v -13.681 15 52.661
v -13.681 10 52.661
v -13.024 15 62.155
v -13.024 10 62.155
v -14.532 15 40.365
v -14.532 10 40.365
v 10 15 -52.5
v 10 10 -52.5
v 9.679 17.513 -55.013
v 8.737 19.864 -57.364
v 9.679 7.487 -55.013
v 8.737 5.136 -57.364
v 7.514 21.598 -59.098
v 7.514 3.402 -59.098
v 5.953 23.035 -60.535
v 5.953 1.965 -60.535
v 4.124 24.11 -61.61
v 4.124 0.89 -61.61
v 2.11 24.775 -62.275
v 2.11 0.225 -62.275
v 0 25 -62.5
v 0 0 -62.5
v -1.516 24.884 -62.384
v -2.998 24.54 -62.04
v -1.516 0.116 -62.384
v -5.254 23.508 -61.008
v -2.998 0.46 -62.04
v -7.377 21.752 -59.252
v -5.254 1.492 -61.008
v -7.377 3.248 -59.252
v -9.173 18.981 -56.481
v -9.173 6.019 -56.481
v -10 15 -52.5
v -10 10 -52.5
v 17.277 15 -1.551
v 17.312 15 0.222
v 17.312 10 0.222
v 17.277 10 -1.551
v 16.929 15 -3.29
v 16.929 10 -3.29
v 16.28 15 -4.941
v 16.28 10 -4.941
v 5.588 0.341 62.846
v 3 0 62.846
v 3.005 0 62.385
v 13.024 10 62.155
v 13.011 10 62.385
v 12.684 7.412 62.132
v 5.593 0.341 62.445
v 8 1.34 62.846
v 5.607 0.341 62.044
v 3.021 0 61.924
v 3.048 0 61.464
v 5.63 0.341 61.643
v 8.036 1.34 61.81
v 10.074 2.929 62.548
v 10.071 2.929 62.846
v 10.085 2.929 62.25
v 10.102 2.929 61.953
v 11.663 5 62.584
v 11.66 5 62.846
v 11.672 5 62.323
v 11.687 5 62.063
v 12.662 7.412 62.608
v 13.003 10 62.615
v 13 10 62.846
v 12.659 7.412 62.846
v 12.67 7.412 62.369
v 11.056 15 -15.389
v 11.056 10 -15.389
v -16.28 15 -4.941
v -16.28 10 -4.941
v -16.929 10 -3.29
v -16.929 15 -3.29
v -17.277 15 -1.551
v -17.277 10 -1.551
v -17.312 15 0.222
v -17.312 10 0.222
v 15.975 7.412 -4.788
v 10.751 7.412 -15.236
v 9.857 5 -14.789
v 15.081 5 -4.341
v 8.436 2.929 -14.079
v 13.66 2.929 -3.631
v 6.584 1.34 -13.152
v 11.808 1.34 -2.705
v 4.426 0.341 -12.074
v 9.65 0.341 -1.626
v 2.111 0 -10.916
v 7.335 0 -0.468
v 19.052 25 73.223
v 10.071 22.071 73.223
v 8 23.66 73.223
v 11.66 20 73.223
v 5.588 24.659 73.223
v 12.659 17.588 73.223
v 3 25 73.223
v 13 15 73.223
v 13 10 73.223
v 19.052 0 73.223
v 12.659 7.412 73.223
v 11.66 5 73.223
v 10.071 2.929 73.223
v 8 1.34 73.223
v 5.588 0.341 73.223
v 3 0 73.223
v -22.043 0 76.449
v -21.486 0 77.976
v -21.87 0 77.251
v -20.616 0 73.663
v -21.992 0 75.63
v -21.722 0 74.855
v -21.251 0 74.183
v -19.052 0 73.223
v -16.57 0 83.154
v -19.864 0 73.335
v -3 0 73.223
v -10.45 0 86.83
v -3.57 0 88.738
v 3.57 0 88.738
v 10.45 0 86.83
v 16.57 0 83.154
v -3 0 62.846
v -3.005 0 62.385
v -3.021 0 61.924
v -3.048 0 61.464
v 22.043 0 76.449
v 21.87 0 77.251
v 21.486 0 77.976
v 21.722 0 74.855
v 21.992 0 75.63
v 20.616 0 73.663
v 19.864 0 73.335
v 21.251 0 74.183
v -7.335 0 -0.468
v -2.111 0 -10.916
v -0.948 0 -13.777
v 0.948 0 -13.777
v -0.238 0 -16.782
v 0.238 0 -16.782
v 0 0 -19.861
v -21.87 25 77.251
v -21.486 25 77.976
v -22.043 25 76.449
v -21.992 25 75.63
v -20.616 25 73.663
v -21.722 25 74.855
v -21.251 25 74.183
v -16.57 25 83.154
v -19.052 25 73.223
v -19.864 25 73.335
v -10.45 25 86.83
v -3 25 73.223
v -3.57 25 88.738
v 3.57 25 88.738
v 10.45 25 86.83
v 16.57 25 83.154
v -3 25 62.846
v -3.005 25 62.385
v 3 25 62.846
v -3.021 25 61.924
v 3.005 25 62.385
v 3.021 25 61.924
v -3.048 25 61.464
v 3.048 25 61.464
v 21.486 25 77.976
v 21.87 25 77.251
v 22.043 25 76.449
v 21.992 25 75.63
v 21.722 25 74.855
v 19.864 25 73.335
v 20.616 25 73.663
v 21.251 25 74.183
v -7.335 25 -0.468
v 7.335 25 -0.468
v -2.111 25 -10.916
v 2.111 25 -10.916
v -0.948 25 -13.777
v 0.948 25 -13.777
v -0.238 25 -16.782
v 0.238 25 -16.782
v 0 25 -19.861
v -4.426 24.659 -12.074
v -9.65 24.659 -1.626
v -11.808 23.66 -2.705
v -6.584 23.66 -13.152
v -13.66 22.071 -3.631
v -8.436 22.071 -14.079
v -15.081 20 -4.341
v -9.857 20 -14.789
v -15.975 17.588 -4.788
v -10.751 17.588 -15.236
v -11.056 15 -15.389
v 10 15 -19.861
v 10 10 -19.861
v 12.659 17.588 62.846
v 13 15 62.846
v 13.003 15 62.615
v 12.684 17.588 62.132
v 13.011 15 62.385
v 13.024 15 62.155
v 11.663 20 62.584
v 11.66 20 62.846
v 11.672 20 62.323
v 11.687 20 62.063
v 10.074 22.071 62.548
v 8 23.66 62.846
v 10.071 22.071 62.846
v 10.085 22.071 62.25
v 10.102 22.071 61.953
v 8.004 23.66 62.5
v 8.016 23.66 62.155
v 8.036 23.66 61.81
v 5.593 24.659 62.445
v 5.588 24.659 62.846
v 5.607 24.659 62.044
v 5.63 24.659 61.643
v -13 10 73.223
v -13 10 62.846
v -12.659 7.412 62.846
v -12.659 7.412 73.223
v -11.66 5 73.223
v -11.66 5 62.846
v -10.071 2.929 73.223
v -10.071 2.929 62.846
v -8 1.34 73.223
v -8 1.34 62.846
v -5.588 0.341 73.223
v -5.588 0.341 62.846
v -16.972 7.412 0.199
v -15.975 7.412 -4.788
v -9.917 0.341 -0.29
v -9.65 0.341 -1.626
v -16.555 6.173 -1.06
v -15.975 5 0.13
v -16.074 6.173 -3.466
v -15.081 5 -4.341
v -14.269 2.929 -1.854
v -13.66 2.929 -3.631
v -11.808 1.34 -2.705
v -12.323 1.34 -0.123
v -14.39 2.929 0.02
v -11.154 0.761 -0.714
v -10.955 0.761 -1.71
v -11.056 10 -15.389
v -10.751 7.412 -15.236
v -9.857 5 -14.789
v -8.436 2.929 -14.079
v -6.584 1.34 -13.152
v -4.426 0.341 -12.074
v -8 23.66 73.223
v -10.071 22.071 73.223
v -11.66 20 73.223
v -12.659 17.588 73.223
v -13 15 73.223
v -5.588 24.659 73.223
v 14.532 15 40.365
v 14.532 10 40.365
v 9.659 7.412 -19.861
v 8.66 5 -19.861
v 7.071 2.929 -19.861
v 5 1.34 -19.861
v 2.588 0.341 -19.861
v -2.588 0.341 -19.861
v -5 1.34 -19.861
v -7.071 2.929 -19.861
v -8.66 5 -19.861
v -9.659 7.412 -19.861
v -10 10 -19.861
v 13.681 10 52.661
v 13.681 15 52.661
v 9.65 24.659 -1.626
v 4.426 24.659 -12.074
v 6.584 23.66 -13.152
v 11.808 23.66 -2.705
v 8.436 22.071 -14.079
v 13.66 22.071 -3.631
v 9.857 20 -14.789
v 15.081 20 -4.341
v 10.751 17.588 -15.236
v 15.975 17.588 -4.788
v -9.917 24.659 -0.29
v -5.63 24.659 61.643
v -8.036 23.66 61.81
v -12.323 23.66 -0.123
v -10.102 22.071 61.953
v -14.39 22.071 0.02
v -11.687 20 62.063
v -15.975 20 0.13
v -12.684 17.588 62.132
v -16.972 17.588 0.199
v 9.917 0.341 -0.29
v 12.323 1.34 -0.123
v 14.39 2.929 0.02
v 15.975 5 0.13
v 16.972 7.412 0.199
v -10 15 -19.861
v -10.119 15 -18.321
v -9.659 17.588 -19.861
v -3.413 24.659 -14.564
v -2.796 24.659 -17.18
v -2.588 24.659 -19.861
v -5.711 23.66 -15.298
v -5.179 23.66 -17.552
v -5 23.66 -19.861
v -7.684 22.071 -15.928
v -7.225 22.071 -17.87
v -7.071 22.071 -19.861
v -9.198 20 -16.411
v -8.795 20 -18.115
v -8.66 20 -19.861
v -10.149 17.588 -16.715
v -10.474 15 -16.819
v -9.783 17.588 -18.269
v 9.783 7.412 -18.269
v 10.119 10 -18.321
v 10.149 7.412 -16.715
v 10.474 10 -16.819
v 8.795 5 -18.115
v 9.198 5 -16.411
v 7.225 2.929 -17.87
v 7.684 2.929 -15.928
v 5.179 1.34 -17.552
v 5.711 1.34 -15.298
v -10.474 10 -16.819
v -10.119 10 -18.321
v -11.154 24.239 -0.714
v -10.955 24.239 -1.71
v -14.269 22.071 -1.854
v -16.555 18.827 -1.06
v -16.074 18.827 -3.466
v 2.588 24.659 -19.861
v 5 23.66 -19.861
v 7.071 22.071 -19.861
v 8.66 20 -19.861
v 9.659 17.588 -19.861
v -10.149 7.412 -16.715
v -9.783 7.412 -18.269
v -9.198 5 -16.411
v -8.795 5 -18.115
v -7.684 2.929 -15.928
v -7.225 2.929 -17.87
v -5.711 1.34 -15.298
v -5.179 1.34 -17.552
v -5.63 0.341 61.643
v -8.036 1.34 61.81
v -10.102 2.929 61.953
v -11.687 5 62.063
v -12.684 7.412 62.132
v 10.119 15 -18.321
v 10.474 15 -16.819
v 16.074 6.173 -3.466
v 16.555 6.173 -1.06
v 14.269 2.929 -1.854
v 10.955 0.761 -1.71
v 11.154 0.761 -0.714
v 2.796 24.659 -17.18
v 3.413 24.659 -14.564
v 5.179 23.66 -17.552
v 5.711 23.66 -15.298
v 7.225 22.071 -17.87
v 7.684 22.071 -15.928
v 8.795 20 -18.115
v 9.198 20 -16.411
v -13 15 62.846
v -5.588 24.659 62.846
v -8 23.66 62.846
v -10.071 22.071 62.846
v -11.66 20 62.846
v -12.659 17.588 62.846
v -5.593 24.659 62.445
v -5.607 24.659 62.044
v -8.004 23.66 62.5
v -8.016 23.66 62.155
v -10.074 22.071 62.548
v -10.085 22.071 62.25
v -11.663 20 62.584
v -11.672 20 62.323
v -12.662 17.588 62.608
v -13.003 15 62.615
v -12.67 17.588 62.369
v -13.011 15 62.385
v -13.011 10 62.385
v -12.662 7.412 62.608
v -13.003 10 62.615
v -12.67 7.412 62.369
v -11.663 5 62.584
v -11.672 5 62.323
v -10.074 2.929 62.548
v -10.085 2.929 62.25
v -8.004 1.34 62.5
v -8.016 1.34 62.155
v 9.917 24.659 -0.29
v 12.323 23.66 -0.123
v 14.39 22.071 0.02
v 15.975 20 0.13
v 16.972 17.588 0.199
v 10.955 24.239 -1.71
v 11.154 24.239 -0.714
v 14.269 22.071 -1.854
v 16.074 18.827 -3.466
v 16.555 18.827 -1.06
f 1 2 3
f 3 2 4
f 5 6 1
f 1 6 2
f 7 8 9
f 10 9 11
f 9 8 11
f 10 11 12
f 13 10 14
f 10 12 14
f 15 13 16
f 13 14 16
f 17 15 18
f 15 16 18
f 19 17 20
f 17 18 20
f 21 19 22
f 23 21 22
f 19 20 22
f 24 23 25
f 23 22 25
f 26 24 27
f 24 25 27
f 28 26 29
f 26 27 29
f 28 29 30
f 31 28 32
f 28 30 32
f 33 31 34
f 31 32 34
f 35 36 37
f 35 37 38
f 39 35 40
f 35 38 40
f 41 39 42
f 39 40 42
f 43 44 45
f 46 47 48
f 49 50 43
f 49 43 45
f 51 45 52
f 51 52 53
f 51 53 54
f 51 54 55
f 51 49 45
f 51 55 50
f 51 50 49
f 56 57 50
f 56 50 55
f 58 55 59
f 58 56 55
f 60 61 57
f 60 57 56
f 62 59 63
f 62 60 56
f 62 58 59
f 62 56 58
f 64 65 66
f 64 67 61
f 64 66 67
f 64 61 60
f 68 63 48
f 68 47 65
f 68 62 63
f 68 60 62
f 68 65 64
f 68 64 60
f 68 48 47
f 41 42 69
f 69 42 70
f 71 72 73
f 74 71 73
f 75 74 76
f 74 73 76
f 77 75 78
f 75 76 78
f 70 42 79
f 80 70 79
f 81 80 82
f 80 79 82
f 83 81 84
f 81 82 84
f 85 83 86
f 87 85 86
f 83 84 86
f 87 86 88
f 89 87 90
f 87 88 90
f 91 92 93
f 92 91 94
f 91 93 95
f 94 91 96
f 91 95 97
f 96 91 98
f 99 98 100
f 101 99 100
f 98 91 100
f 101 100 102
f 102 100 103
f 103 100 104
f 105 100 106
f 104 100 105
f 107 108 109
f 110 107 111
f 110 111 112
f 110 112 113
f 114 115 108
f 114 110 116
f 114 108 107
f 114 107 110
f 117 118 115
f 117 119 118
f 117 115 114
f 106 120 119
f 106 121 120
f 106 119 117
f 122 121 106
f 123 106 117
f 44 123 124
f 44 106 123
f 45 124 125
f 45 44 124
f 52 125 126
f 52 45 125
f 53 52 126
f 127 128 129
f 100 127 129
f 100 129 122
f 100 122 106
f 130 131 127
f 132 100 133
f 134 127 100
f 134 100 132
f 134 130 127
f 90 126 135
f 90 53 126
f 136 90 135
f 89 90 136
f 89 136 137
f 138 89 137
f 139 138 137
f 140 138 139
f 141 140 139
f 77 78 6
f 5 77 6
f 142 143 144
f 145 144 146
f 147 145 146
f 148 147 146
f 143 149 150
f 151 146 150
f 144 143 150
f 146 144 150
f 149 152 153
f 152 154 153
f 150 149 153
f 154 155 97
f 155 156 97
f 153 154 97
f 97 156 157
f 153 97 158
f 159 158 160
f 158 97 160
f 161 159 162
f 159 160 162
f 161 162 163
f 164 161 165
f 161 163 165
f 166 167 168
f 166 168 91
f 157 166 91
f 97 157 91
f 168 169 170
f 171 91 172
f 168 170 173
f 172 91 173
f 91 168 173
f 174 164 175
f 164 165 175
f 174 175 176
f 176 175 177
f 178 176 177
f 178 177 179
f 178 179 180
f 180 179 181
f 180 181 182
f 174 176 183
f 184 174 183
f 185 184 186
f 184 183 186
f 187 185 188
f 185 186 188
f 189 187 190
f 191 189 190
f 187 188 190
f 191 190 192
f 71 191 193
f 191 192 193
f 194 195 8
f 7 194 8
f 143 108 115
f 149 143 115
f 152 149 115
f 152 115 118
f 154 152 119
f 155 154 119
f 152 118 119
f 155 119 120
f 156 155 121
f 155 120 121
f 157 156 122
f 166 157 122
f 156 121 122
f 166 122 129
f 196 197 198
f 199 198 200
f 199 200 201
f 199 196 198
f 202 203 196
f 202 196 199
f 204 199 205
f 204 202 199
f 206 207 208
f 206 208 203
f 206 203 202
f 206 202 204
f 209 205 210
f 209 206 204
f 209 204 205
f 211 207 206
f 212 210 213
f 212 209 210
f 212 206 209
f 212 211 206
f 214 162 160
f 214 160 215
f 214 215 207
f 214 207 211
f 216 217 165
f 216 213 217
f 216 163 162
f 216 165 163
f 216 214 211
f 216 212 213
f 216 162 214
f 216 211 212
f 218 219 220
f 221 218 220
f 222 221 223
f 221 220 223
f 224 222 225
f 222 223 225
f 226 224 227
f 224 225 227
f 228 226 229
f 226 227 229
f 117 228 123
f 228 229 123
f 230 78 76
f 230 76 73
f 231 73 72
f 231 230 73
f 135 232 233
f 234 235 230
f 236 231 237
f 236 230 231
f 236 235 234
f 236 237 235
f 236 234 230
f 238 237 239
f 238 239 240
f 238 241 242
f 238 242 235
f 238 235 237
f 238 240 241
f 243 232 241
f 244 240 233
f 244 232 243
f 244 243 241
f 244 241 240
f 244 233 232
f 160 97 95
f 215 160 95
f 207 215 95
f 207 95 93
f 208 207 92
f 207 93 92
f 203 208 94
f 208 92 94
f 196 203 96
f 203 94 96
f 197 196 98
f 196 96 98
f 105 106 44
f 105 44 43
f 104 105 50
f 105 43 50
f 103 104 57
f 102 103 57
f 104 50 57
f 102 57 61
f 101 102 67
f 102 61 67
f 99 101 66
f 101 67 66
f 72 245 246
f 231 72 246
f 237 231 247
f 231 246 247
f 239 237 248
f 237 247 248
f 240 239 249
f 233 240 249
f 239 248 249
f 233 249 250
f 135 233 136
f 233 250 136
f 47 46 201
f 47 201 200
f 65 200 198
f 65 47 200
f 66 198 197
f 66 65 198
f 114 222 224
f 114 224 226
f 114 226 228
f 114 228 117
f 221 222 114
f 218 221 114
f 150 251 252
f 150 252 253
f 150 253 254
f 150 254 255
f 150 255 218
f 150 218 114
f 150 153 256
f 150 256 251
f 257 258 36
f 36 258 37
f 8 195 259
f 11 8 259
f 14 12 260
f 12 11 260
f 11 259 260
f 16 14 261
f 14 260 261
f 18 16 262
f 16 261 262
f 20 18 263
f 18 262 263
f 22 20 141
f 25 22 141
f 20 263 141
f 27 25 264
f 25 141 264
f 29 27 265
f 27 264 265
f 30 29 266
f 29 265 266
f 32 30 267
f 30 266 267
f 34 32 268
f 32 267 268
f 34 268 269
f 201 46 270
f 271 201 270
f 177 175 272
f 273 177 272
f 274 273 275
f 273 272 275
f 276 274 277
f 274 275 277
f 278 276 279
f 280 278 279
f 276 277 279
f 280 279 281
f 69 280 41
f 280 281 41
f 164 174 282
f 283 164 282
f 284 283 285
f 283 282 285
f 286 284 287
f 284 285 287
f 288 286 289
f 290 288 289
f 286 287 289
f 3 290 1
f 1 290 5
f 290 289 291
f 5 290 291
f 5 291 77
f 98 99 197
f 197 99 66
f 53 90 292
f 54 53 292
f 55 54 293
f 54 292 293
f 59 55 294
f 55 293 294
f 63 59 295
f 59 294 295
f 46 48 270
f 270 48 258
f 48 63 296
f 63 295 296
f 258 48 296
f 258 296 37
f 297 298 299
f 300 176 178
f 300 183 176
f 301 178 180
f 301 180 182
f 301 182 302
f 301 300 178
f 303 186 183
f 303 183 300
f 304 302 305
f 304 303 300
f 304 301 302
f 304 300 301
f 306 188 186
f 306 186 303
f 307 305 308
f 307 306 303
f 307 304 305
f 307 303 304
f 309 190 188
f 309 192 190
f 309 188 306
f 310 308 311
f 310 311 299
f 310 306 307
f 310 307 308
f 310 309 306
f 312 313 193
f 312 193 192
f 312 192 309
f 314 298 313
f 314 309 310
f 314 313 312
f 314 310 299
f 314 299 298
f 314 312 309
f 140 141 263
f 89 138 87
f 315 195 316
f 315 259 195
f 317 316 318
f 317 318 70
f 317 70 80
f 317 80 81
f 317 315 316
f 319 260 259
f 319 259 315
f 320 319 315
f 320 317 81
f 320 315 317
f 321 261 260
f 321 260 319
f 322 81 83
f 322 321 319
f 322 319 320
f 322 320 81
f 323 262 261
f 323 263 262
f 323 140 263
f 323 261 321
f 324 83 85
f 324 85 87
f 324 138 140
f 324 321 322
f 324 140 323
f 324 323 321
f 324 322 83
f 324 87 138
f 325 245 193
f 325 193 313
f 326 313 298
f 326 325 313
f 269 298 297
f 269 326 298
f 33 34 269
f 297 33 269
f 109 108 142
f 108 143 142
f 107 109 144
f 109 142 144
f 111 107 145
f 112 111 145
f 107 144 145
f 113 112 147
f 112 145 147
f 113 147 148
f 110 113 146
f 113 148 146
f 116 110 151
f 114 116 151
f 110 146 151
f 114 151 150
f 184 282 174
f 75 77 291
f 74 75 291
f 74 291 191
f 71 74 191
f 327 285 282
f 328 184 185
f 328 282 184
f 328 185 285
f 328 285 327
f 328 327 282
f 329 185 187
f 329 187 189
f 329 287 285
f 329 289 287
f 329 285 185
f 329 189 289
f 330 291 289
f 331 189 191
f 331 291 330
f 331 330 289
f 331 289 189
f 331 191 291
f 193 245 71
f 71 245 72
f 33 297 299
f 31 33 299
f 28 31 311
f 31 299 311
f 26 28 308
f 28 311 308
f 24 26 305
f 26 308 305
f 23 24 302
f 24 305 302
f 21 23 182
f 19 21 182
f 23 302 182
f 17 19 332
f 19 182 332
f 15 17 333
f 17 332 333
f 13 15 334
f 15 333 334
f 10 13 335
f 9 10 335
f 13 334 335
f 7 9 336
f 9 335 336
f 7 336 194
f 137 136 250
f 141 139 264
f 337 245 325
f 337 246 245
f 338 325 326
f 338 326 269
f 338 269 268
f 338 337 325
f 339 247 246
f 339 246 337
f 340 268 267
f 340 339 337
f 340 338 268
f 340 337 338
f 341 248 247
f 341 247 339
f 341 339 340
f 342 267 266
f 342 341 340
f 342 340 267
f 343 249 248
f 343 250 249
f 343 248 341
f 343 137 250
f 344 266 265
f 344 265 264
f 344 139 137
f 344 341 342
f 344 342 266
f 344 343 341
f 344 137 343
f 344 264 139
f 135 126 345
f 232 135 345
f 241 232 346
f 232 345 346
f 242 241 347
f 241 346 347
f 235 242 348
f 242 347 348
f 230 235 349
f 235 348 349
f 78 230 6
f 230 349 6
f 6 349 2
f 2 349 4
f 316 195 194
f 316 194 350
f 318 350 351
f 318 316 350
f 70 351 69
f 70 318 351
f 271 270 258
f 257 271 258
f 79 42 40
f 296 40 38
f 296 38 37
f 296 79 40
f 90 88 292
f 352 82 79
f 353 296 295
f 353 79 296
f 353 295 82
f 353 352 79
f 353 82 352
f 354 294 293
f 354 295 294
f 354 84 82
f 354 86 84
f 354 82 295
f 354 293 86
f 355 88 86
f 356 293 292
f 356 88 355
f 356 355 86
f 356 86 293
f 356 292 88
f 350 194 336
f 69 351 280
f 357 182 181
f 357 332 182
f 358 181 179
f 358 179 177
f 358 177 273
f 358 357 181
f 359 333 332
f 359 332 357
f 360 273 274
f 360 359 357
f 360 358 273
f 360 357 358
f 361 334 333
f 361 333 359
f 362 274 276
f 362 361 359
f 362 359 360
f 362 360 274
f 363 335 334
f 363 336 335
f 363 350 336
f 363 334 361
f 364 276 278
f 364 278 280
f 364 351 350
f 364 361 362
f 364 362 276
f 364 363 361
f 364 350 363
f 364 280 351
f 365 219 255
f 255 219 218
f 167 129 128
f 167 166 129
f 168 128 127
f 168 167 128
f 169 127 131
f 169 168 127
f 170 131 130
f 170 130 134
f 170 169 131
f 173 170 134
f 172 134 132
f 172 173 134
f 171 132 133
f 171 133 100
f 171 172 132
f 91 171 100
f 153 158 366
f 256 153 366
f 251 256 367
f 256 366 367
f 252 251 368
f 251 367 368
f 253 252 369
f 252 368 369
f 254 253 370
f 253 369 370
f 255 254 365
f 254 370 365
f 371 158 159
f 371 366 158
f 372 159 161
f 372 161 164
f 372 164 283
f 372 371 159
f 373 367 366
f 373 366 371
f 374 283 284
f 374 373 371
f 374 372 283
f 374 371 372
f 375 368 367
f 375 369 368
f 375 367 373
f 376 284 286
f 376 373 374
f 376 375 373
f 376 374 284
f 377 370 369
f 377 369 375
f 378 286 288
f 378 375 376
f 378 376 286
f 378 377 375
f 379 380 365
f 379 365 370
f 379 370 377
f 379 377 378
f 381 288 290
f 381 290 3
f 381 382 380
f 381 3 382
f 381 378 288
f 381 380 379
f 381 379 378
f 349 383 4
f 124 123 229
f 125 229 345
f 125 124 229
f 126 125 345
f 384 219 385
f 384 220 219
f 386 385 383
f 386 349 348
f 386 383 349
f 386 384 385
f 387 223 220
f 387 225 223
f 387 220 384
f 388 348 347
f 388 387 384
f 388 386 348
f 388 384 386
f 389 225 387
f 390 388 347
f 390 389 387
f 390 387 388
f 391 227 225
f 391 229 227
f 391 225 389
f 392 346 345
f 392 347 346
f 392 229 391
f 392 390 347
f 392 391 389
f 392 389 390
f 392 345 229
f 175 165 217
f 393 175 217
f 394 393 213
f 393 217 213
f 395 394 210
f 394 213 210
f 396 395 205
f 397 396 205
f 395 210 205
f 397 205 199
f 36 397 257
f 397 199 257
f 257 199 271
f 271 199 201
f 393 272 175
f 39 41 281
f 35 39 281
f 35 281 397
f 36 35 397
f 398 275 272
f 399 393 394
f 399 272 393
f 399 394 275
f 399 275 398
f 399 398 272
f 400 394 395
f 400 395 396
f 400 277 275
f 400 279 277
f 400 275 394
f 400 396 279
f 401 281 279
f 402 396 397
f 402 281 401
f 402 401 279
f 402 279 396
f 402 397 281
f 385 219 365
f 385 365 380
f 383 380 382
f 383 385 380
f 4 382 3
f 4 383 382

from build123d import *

# Parameters (mm, degrees)
SKETCH_1_W      = 26
SKETCH_1_H      = 0.722748137
EXTRUDE_1_DEPTH = 25
FILLET_1_R      = 3
FILLET_2_R      = 10


with BuildPart() as part:
    # 草图1 → 凸台-拉伸1 (new body)
    with BuildSketch(Plane(origin=(0, 0, 0), x_dir=(1, 0, 0), z_dir=(0, 1, 0))):
        with BuildLine():
            Line((-13, -85.256490319), (-13, -73.222748137))
            Line((-13, -73.222748137), (-24.211080276, -73.222748137))
            ThreePointArc((-24.211080276, -73.222748137), (0, -88.97930769), (24.211080276, -73.222748137))
            Line((24.211080276, -73.222748137), (13, -73.222748137))
            Line((13, -73.222748137), (13, -85.256490319))
            Line((13, -85.256490319), (-13, -85.256490319))
        make_face()
        with BuildLine():
            ThreePointArc((13, -73.222748137), (0, -79.351626853), (-13, -73.222748137))
            Line((-13, -73.222748137), (-13, -85.256490319))
            Line((-13, -85.256490319), (13, -85.256490319))
            Line((13, -85.256490319), (13, -73.222748137))
        make_face()
        with BuildLine():
            Line((13, -73.222748137), (-13, -73.222748137))
            ThreePointArc((-13, -73.222748137), (0, -79.351626853), (13, -73.222748137))
        make_face()
        with Locations((0, -72.861374068)):
            Rectangle(SKETCH_1_W, SKETCH_1_H)
        Polygon((13, -62.5), (0, -62.5), (-13, -62.5), (-13, -72.5), (13, -72.5), align=None)
        with BuildLine():
            Line((0, -62.5), (0, -45.648373147))
            ThreePointArc((0, -45.648373147), (-7.186152558, -47.257410357), (-13, -51.777251863))
            Line((-13, -51.777251863), (-13, -62.5))
            Line((-13, -62.5), (0, -62.5))
        make_face()
        with BuildLine():
            ThreePointArc((13, -51.777251863), (7.186152558, -47.257410357), (0, -45.648373147))
            Line((0, -45.648373147), (0, -62.5))
            Line((0, -62.5), (13, -62.5))
            Line((13, -62.5), (13, -51.777251863))
        make_face()
        with BuildLine():
            ThreePointArc((13, -39.431542406), (6.72000555, -36.887595561), (0, -36.02069231))
            Line((0, -36.02069231), (0, -45.648373147))
            ThreePointArc((0, -45.648373147), (7.186152558, -47.257410357), (13, -51.777251863))
            Line((13, -51.777251863), (13, -39.431542406))
        make_face()
        with BuildLine():
            Line((0, -45.648373147), (0, -36.02069231))
            ThreePointArc((0, -36.02069231), (-6.72000555, -36.887595561), (-13, -39.431542406))
            Line((-13, -39.431542406), (-13, -51.777251863))
            ThreePointArc((-13, -51.777251863), (-7.186152558, -47.257410357), (0, -45.648373147))
        make_face()
        with BuildLine():
            Line((0, -36.02069231), (0, 2.5))
            Line((0, 2.5), (-13, 2.5))
            Line((-13, 2.5), (-13, -39.431542406))
            ThreePointArc((-13, -39.431542406), (-6.72000555, -36.887595561), (0, -36.02069231))
        make_face()
        with BuildLine():
            Line((13, 2.5), (0, 2.5))
            Line((0, 2.5), (0, -36.02069231))
            ThreePointArc((0, -36.02069231), (6.72000555, -36.887595561), (13, -39.431542406))
            Line((13, -39.431542406), (13, 2.5))
        make_face()
        Polygon((0, 2.5), (0, 62.5), (-10, 62.5), (-10, 17.5), (-17.5, 2.5), (-13, 2.5), align=None)
        Polygon((10, 62.5), (0, 62.5), (0, 2.5), (13, 2.5), (17.5, 2.5), (10, 17.5), align=None)
        with BuildLine():
            Line((17.5, 2.5), (13, 2.5))
            Line((13, 2.5), (13, -39.431542406))
            ThreePointArc((13, -39.431542406), (13.774122837, -39.885242079), (14.532429345, -40.364909463))
            Line((14.532429345, -40.364909463), (17.5, 2.5))
        make_face()
        with BuildLine():
            Line((-13, -39.431542406), (-13, 2.5))
            Line((-13, 2.5), (-17.5, 2.5))
            Line((-17.5, 2.5), (-14.532429345, -40.364909463))
            ThreePointArc((-14.532429345, -40.364909463), (-13.774122837, -39.885242079), (-13, -39.431542406))
        make_face()
        with BuildLine():
            ThreePointArc((14.532429345, -40.364909463), (13.774122837, -39.885242079), (13, -39.431542406))
            Line((13, -39.431542406), (13, -51.777251863))
            ThreePointArc((13, -51.777251863), (13.347894441, -52.213550583), (13.681152635, -52.661128612))
            Line((13.681152635, -52.661128612), (14.532429345, -40.364909463))
        make_face()
        with BuildLine():
            Line((-13, -51.777251863), (-13, -39.431542406))
            ThreePointArc((-13, -39.431542406), (-13.774122837, -39.885242079), (-14.532429345, -40.364909463))
            Line((-14.532429345, -40.364909463), (-13.681152635, -52.661128612))
            ThreePointArc((-13.681152635, -52.661128612), (-13.347894441, -52.213550583), (-13, -51.777251863))
        make_face()
        with BuildLine():
            ThreePointArc((13.681152635, -52.661128612), (13.347894441, -52.213550583), (13, -51.777251863))
            Line((13, -51.777251863), (13, -62.5))
            Line((13, -62.5), (13.681152635, -52.661128612))
        make_face()
        with BuildLine():
            Line((-13, -62.5), (-13, -51.777251863))
            ThreePointArc((-13, -51.777251863), (-13.347894441, -52.213550583), (-13.681152635, -52.661128612))
            Line((-13.681152635, -52.661128612), (-13, -62.5))
        make_face()
    extrude(amount=EXTRUDE_1_DEPTH)

    # 圆角1
    fillet_1_edges = [part.edges().sort_by_distance(p)[0] for p in [
        (24.211080276, 12.5, 73.222748137),
        (-24.211080276, 12.5, 73.222748137),
    ]]
    fillet(fillet_1_edges, radius=FILLET_1_R)

    # 圆角2
    # the kernel refuses this fillet: 10 mm, written as the material it adds along each edge
    with BuildSketch(Plane(origin=(-10, 0, -17.5), x_dir=(-0.44721359549995854, 0, 0.8944271909999156), z_dir=(0, 1, 0)), Plane(origin=(10, 0, -17.5), x_dir=(0, 0, -1), z_dir=(0, 1, 0))) as fillet_2_piece_1:
        with BuildLine():
            CenterArc((FILLET_2_R * 0.2360679775, -FILLET_2_R), FILLET_2_R, 90, 26.565051177)
            Line((-FILLET_2_R * 0.211145618, -FILLET_2_R * 0.105572809), (0, 0))
            Line((0, 0), (FILLET_2_R * 0.2360679775, 0))
        make_face()
    extrude(amount=25)
    with BuildSketch(Plane(origin=(-13, 0, 62.5), x_dir=(0, 0, 1), z_dir=(0, 1, 0))) as fillet_2_piece_2:
        with BuildLine():
            CenterArc((FILLET_2_R * 0.0345740067021, -FILLET_2_R), FILLET_2_R, 90, 3.96031183)
            Line((-FILLET_2_R * 0.0344914484856, -FILLET_2_R * 0.00238786951054), (0, 0))
            Line((0, 0), (FILLET_2_R * 0.0345740067021, 0))
        make_face()
    extrude(amount=25)
    with BuildSketch(Plane(origin=(13, 0, 62.5), x_dir=(0, 0, 1), z_dir=(0, 1, 0))) as fillet_2_piece_3:
        with BuildLine():
            CenterArc((FILLET_2_R * 0.0345740067021, FILLET_2_R), FILLET_2_R, 266.03968817, 3.96031183)
            Line((-FILLET_2_R * 0.0344914484856, FILLET_2_R * 0.00238786951054), (0, 0))
            Line((0, 0), (FILLET_2_R * 0.0345740067021, 0))
        make_face()
    extrude(amount=25)
    # the kernel refuses this fillet: 10 mm, written as the material it takes off along each edge
    with BuildSketch(Plane(origin=(-10, -25, -62.5), x_dir=(0, 0, 1), z_dir=(0, 1, 0)), Plane(origin=(10, -25, -62.5), x_dir=(-1, 0, 0), z_dir=(0, 1, 0))) as fillet_2_2_piece_1:
        with BuildLine():
            CenterArc((FILLET_2_R, FILLET_2_R), FILLET_2_R, 180, 90)
            Line((0, FILLET_2_R), (0, 0))
            Line((0, 0), (FILLET_2_R, 0))
        make_face()
    extrude(amount=75, mode=Mode.SUBTRACT)
    with BuildSketch(Plane(origin=(-17.5, -6.821727287, -2.5), x_dir=(0.06906545518773138, 0, 0.9976121304894561), z_dir=(0, 1, 0))) as fillet_2_2_piece_2:
        with BuildLine():
            CenterArc((FILLET_2_R * 0.272869091474, FILLET_2_R), FILLET_2_R, 239.474636992, 30.525363008)
            Line((-FILLET_2_R * 0.235050637395, FILLET_2_R * 0.138595594958), (0, 0))
            Line((0, 0), (FILLET_2_R * 0.272869091474, 0))
        make_face()
    extrude(amount=38.643454574, mode=Mode.SUBTRACT)
    with BuildSketch(Plane(origin=(17.5, -6.821727287, -2.5), x_dir=(-0.06906545518773137, 0, 0.9976121304894561), z_dir=(0, 1, 0))) as fillet_2_2_piece_3:
        with BuildLine():
            CenterArc((FILLET_2_R * 0.272869091474, -FILLET_2_R), FILLET_2_R, 90, 30.525363008)
            Line((-FILLET_2_R * 0.235050637395, -FILLET_2_R * 0.138595594958), (0, 0))
            Line((0, 0), (FILLET_2_R * 0.272869091474, 0))
        make_face()
    extrude(amount=38.643454574, mode=Mode.SUBTRACT)
    # the kernel refuses this fillet: 10 mm, written as the material it takes off along each edge
    with BuildSketch(Plane(origin=(-13, 0, 62.845740067), x_dir=(1, 0, 0), z_dir=(0, 0, 1)), Plane(origin=(-13, 25, 62.845740067), x_dir=(0, -1, 0), z_dir=(0, 0, 1)), Plane(origin=(13, 25, 73.222748137), x_dir=(0, -1, 0), z_dir=(0, 0, -1))) as fillet_2_3_piece_1:
        with BuildLine():
            CenterArc((FILLET_2_R, FILLET_2_R), FILLET_2_R, 180, 90)
            Line((0, FILLET_2_R), (0, 0))
            Line((0, 0), (FILLET_2_R, 0))
        make_face()
    extrude(amount=10.37700807, mode=Mode.SUBTRACT)
    with BuildSketch(Plane(origin=(13, 0, 62.845740067), x_dir=(-1, 0, 0), z_dir=(0, 0, 1))) as fillet_2_3_piece_2:
        with BuildLine():
            CenterArc((FILLET_2_R, -FILLET_2_R), FILLET_2_R, 90, 90)
            Line((0, -FILLET_2_R), (0, 0))
            Line((0, 0), (FILLET_2_R, 0))
        make_face()
    extrude(amount=10.37700807, mode=Mode.SUBTRACT)
    with BuildSketch(Plane(origin=(16.279692325, 0, -4.94061535), x_dir=(-0.8944271909999149, 0, 0.44721359549996015), z_dir=(-0.44721359549996015, 0, -0.8944271909999147)), Plane(origin=(16.279692325, 25, -4.94061535), x_dir=(0, -1, 0), z_dir=(-0.44721359549996015, 0, -0.8944271909999147)), Plane(origin=(-11.05572809, 0, -15.38854382), x_dir=(0.8944271909999155, 0, 0.44721359549995876), z_dir=(-0.4472135954999587, 0, 0.8944271909999155)), Plane(origin=(-11.05572809, 25, -15.38854382), x_dir=(0, -1, 0), z_dir=(-0.4472135954999587, 0, 0.8944271909999155))) as fillet_2_3_piece_3:
        with BuildLine():
            CenterArc((FILLET_2_R, FILLET_2_R), FILLET_2_R, 180, 90)
            Line((0, FILLET_2_R), (0, 0))
            Line((0, 0), (FILLET_2_R, 0))
        make_face()
    extrude(amount=11.681139142, mode=Mode.SUBTRACT)
    with BuildSketch(Plane(origin=(-10, 0, -77.5), x_dir=(1, 0, 0), z_dir=(0, 0, 1)), Plane(origin=(-10, 25, -77.5), x_dir=(0, -1, 0), z_dir=(0, 0, 1)), Plane(origin=(10, 0, -19.860679775), x_dir=(-1, 0, 0), z_dir=(0, 0, -1)), Plane(origin=(10, 25, -19.860679775), x_dir=(0, -1, 0), z_dir=(0, 0, -1))) as fillet_2_3_piece_4:
        with BuildLine():
            CenterArc((FILLET_2_R, FILLET_2_R), FILLET_2_R, 180, 90)
            Line((0, FILLET_2_R), (0, 0))
            Line((0, 0), (FILLET_2_R, 0))
        make_face()
    extrude(amount=57.639320225, mode=Mode.SUBTRACT)
    with BuildSketch(Plane(origin=(-13.023878695, 0, 62.155085515), x_dir=(0.9976121304894561, 0, -0.06906545518773156), z_dir=(-0.06906545518773156, 0, -0.9976121304894561)), Plane(origin=(17.31154172, 0, 0.222175157), x_dir=(-0.9976121304894561, 0, -0.06906545518773156), z_dir=(-0.06906545518773156, 0, 0.9976121304894561))) as fillet_2_3_piece_5:
        with BuildLine():
            CenterArc((FILLET_2_R, -FILLET_2_R), FILLET_2_R, 90, 90)
            Line((0, -FILLET_2_R), (0, 0))
            Line((0, 0), (FILLET_2_R, 0))
        make_face()
    extrude(amount=62.081152048, mode=Mode.SUBTRACT)
    with BuildSketch(Plane(origin=(-17.31154172, 25, 0.222175157), x_dir=(0, -1, 0), z_dir=(0.06906545518773156, 0, 0.9976121304894561)), Plane(origin=(13.023878695, 25, 62.155085515), x_dir=(0, -1, 0), z_dir=(0.06906545518773156, 0, -0.9976121304894561))) as fillet_2_3_piece_6:
        with BuildLine():
            CenterArc((FILLET_2_R, FILLET_2_R), FILLET_2_R, 180, 90)
            Line((0, FILLET_2_R), (0, 0))
            Line((0, 0), (FILLET_2_R, 0))
        make_face()
    extrude(amount=62.081152048, mode=Mode.SUBTRACT)
    with BuildSketch(Plane(origin=(20, 25, -19.860679775), x_dir=(-1, 0, 0), z_dir=(0, 0, -1))) as fillet_2_3_piece_7:
        with BuildLine():
            CenterArc((10 + FILLET_2_R, -FILLET_2_R), FILLET_2_R, 90, 90)
            Line((10 + FILLET_2_R, 0), (10, 0))
            Line((10, 0), (10, -FILLET_2_R))
        make_face()
    revolve(axis=Axis((20, 25, -19.860679775), (0, 1, 0)), revolution_arc=26.565051177, mode=Mode.SUBTRACT)
    with BuildSketch(Plane(origin=(20, 0, -19.860679775), x_dir=(-1, 0, 0), z_dir=(0, 0, -1))) as fillet_2_3_piece_8:
        with BuildLine():
            CenterArc((10 + FILLET_2_R, FILLET_2_R), FILLET_2_R, 180, 90)
            Line((10, FILLET_2_R), (10, 0))
            Line((10, 0), (10 + FILLET_2_R, 0))
        make_face()
    revolve(axis=Axis((20, 0, -19.860679775), (0, 1, 0)), revolution_arc=26.565051177, mode=Mode.SUBTRACT)
    with BuildSketch(Plane(origin=(23, 25, 62.845740067), x_dir=(-1, 0, 0), z_dir=(0, 0, 1))) as fillet_2_3_piece_9:
        with BuildLine():
            CenterArc((10 + FILLET_2_R, FILLET_2_R), FILLET_2_R, 180, 90)
            Line((10 + FILLET_2_R, 0), (10, 0))
            Line((10, 0), (10, FILLET_2_R))
        make_face()
    revolve(axis=Axis((23, 25, 62.845740067), (0, -1, 0)), revolution_arc=3.96031183, mode=Mode.SUBTRACT)
    with BuildSketch(Plane(origin=(7.335420415, 25, -0.468479395), x_dir=(0.8944271909999149, 0, -0.4472135954999599), z_dir=(-0.4472135954999599, 0, -0.8944271909999149))) as fillet_2_3_piece_10:
        with BuildLine():
            CenterArc((10 - FILLET_2_R, FILLET_2_R), FILLET_2_R, 270, 90)
            Line((10 - FILLET_2_R, 0), (10, 0))
            Line((10, 0), (10, FILLET_2_R))
        make_face()
    revolve(axis=Axis((7.335420415, 25, -0.468479395), (0, -1, 0)), revolution_arc=30.525363008, mode=Mode.SUBTRACT)
    with BuildSketch(Plane(origin=(7.335420415, 0, -0.468479395), x_dir=(0.8944271909999149, 0, -0.4472135954999599), z_dir=(-0.4472135954999599, 0, -0.8944271909999149))) as fillet_2_3_piece_11:
        with BuildLine():
            CenterArc((10 - FILLET_2_R, -FILLET_2_R), FILLET_2_R, 0, 90)
            Line((10, -FILLET_2_R), (10, 0))
            Line((10, 0), (10 - FILLET_2_R, 0))
        make_face()
    revolve(axis=Axis((7.335420415, 0, -0.468479395), (0, -1, 0)), revolution_arc=30.525363008, mode=Mode.SUBTRACT)
    with BuildSketch(Plane(origin=(23, 0, 62.845740067), x_dir=(-1, 0, 0), z_dir=(0, 0, 1))) as fillet_2_3_piece_12:
        with BuildLine():
            CenterArc((10 + FILLET_2_R, -FILLET_2_R), FILLET_2_R, 90, 90)
            Line((10, -FILLET_2_R), (10, 0))
            Line((10, 0), (10 + FILLET_2_R, 0))
        make_face()
    revolve(axis=Axis((23, 0, 62.845740067), (0, -1, 0)), revolution_arc=3.96031183, mode=Mode.SUBTRACT)
    with BuildSketch(Plane(origin=(-7.335420415, 25, -0.468479395), x_dir=(-0.9976121304894561, 0, 0.06906545518773152), z_dir=(0.06906545518773152, 0, 0.9976121304894561))) as fillet_2_3_piece_13:
        with BuildLine():
            CenterArc((10 - FILLET_2_R, FILLET_2_R), FILLET_2_R, 270, 90)
            Line((10 - FILLET_2_R, 0), (10, 0))
            Line((10, 0), (10, FILLET_2_R))
        make_face()
    revolve(axis=Axis((-7.335420415, 25, -0.468479395), (0, -1, 0)), revolution_arc=30.525363008, mode=Mode.SUBTRACT)
    with BuildSketch(Plane(origin=(-23, 25, 62.845740067), x_dir=(1, 0, 0), z_dir=(0, 0, 1))) as fillet_2_3_piece_14:
        with BuildLine():
            CenterArc((10 + FILLET_2_R, -FILLET_2_R), FILLET_2_R, 90, 90)
            Line((10 + FILLET_2_R, 0), (10, 0))
            Line((10, 0), (10, -FILLET_2_R))
        make_face()
    revolve(axis=Axis((-23, 25, 62.845740067), (0, 1, 0)), revolution_arc=3.96031183, mode=Mode.SUBTRACT)
    with BuildSketch(Plane(origin=(-23, 0, 62.845740067), x_dir=(1, 0, 0), z_dir=(0, 0, 1))) as fillet_2_3_piece_15:
        with BuildLine():
            CenterArc((10 + FILLET_2_R, FILLET_2_R), FILLET_2_R, 180, 90)
            Line((10, FILLET_2_R), (10, 0))
            Line((10, 0), (10 + FILLET_2_R, 0))
        make_face()
    revolve(axis=Axis((-23, 0, 62.845740067), (0, 1, 0)), revolution_arc=3.96031183, mode=Mode.SUBTRACT)
    with BuildSketch(Plane(origin=(-7.335420415, 0, -0.468479395), x_dir=(-0.9976121304894561, 0, 0.06906545518773152), z_dir=(0.06906545518773152, 0, 0.9976121304894561))) as fillet_2_3_piece_16:
        with BuildLine():
            CenterArc((10 - FILLET_2_R, -FILLET_2_R), FILLET_2_R, 0, 90)
            Line((10, -FILLET_2_R), (10, 0))
            Line((10, 0), (10 - FILLET_2_R, 0))
        make_face()
    revolve(axis=Axis((-7.335420415, 0, -0.468479395), (0, -1, 0)), revolution_arc=30.525363008, mode=Mode.SUBTRACT)
    with BuildSketch(Plane(origin=(-20, 25, -19.860679775), x_dir=(0.8944271909999155, 0, 0.44721359549995865), z_dir=(-0.44721359549995865, 0, 0.8944271909999155))) as fillet_2_3_piece_17:
        with BuildLine():
            CenterArc((10 + FILLET_2_R, -FILLET_2_R), FILLET_2_R, 90, 90)
            Line((10 + FILLET_2_R, 0), (10, 0))
            Line((10, 0), (10, -FILLET_2_R))
        make_face()
    revolve(axis=Axis((-20, 25, -19.860679775), (0, 1, 0)), revolution_arc=26.565051177, mode=Mode.SUBTRACT)
    with BuildSketch(Plane(origin=(-20, 0, -19.860679775), x_dir=(0.8944271909999155, 0, 0.44721359549995865), z_dir=(-0.44721359549995865, 0, 0.8944271909999155))) as fillet_2_3_piece_18:
        with BuildLine():
            CenterArc((10 + FILLET_2_R, FILLET_2_R), FILLET_2_R, 180, 90)
            Line((10, FILLET_2_R), (10, 0))
            Line((10, 0), (10 + FILLET_2_R, 0))
        make_face()
    revolve(axis=Axis((-20, 0, -19.860679775), (0, 1, 0)), revolution_arc=26.565051177, mode=Mode.SUBTRACT)


solid = part.part
